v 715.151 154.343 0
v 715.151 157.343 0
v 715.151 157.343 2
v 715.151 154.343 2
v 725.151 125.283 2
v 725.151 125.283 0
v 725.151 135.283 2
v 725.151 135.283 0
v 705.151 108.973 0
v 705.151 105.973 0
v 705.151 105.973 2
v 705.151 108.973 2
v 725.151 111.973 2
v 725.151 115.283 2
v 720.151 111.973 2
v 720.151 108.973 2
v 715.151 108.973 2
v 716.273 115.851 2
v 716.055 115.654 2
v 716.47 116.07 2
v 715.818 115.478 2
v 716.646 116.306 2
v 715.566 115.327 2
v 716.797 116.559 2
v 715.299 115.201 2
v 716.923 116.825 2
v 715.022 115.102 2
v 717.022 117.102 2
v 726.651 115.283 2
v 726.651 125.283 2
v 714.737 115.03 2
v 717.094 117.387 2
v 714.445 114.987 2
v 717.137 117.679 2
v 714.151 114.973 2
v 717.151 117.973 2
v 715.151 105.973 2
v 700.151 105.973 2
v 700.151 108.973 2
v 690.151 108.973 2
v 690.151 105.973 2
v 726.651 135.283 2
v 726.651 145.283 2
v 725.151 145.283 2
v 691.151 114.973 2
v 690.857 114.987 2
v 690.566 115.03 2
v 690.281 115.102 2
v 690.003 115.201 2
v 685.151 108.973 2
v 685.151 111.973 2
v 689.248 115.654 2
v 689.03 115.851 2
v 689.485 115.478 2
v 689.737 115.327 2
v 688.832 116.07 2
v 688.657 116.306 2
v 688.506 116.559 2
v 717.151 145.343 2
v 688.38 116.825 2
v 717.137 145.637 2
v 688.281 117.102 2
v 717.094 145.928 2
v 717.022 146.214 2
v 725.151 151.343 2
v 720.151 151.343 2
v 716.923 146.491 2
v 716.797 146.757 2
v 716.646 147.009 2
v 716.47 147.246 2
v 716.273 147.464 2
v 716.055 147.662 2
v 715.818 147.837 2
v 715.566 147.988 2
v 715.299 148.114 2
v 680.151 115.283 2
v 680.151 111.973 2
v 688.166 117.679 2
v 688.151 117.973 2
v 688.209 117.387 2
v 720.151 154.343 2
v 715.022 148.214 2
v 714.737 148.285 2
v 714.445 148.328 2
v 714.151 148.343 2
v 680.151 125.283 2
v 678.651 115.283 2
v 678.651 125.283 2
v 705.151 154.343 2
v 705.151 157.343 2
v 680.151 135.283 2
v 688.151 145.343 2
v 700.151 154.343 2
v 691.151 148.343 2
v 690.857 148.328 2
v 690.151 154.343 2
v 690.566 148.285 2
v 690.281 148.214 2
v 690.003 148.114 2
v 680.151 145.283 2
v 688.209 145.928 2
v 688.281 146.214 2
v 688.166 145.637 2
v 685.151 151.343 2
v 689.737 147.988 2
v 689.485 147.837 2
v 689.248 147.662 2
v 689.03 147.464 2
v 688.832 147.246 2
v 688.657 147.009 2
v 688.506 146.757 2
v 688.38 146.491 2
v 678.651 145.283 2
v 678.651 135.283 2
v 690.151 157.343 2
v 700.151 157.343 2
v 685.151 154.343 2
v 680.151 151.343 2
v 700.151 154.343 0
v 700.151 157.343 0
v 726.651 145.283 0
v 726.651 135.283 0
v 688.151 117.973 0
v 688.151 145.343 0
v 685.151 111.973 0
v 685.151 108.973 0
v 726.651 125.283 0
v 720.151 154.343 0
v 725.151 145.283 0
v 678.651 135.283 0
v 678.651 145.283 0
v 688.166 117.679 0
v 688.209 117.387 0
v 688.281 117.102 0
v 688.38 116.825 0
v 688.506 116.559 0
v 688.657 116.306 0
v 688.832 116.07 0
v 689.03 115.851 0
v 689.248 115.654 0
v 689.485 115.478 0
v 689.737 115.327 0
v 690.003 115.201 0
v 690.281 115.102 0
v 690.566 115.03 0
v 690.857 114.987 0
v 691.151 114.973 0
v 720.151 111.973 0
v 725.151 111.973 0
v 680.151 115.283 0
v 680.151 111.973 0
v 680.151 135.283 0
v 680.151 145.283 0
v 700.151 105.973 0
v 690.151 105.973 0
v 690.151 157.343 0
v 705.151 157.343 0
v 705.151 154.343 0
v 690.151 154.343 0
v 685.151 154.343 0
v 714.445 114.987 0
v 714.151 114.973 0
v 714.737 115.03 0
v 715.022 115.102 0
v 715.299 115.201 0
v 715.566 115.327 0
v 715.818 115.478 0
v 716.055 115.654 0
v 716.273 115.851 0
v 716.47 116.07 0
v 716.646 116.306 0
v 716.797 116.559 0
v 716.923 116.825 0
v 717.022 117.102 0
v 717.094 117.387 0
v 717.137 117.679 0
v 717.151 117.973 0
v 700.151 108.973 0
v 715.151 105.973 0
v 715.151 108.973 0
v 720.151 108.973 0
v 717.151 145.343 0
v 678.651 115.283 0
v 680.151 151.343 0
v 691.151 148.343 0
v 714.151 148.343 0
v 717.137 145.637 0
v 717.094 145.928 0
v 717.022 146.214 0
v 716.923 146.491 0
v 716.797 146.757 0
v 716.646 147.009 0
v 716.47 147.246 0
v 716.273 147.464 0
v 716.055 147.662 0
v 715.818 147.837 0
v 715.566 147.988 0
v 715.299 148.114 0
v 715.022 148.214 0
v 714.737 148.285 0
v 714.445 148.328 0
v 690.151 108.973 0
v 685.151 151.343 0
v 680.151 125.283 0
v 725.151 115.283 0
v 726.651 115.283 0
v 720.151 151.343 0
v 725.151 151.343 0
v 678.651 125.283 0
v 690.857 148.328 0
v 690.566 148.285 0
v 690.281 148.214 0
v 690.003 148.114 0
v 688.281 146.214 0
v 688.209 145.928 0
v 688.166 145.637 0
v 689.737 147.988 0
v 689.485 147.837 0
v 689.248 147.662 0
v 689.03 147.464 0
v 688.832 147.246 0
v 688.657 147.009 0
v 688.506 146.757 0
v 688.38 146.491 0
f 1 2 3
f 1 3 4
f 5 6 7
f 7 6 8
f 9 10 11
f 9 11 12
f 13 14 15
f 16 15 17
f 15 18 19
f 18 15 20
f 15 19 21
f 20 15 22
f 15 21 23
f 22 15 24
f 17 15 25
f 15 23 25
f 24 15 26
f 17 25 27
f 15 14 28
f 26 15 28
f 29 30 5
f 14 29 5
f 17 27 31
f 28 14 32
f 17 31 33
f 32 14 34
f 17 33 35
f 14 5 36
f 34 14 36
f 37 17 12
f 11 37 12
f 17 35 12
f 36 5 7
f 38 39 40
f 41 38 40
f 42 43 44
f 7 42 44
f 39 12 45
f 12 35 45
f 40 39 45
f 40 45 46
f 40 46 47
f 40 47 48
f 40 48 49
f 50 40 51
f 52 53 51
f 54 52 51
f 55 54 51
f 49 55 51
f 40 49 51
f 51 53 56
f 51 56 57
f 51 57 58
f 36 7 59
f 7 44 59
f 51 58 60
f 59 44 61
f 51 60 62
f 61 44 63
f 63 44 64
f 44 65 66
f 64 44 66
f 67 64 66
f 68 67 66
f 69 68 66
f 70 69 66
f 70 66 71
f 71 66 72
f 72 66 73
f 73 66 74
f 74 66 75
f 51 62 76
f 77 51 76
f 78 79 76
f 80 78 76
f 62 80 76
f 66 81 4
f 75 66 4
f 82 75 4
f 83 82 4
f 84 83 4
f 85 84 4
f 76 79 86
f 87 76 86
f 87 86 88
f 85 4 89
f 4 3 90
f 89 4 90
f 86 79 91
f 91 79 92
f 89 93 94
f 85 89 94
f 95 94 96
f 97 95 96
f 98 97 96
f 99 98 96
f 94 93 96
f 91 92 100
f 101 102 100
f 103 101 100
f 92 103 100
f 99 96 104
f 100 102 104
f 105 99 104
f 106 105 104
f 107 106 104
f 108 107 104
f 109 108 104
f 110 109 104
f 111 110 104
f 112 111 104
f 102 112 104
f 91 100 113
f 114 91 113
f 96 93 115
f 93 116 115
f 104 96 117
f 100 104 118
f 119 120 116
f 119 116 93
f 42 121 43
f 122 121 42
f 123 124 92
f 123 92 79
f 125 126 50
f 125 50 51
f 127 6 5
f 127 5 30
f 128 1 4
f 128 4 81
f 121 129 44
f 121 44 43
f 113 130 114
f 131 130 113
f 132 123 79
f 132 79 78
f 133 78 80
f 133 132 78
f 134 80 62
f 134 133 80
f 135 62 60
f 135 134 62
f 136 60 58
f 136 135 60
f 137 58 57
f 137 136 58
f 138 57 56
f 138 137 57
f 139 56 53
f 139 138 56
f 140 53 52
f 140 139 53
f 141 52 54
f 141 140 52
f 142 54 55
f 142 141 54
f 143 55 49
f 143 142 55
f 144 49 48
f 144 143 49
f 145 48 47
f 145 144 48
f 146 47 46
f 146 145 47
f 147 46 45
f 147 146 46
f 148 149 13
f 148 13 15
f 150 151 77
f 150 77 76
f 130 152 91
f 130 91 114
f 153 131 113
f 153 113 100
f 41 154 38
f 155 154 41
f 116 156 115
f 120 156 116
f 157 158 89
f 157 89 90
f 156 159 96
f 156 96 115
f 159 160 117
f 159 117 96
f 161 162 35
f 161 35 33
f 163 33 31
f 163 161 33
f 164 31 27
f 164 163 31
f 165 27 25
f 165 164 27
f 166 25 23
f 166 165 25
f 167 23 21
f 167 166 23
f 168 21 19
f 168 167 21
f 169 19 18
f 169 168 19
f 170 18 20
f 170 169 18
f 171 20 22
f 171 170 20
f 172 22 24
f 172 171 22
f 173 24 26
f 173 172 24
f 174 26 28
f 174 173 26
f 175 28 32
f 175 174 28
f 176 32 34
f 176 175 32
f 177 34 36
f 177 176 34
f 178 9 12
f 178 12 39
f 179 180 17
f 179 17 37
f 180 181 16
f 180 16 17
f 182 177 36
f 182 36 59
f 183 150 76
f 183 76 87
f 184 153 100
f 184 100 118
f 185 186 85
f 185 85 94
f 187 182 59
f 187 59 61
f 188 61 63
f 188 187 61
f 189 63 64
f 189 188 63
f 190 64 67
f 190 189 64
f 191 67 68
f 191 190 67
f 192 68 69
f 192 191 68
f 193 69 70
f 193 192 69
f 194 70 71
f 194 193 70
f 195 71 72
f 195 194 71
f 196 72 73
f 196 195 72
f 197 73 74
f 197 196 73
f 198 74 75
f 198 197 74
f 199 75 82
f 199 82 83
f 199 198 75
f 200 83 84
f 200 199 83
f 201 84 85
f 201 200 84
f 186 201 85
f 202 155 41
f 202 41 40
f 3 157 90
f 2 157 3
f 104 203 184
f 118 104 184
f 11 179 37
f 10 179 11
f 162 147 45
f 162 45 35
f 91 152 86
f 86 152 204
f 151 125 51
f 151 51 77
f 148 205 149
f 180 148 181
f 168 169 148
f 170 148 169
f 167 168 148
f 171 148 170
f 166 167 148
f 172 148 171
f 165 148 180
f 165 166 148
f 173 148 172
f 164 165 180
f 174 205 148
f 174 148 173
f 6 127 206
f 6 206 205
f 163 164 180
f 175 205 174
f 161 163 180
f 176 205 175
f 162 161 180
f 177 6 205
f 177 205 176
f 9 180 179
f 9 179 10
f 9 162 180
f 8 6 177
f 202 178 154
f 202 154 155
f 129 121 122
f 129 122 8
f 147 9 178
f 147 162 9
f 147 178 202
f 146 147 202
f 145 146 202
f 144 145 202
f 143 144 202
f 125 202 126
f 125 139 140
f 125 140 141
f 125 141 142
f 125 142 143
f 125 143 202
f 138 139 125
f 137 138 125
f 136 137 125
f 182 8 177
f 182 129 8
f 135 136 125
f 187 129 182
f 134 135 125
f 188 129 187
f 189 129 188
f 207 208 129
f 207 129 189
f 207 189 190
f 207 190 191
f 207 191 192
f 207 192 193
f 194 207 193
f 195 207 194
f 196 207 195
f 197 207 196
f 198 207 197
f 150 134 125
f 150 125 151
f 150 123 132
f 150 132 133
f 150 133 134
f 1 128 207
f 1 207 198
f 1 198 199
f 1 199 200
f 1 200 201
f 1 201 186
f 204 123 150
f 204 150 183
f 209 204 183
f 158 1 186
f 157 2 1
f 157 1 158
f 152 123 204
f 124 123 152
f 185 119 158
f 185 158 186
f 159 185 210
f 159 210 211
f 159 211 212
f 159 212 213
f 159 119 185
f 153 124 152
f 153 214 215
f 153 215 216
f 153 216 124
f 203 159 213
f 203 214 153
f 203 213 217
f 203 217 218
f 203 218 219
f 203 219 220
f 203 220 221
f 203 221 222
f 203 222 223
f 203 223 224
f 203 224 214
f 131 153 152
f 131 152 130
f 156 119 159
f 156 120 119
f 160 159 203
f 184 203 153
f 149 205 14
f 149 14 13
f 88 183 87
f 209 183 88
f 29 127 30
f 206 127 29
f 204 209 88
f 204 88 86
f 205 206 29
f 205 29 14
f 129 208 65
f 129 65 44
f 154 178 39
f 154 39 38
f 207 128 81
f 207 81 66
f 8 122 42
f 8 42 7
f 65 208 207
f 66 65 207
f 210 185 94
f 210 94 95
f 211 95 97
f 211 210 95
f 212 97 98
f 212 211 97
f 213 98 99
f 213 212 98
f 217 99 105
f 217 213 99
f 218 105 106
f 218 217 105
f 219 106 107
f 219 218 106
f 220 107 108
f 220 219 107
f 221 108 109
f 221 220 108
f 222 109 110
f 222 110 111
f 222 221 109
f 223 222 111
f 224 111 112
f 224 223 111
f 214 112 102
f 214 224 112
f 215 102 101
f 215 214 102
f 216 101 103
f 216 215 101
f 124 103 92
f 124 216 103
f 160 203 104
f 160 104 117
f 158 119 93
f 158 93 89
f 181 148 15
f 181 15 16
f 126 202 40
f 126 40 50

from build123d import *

# Parameters (mm, degrees)
EXTRUDE_1_DEPTH = 2


with BuildPart() as part:
    # Model → 凸台-拉伸1 (new body)
    with BuildSketch(Plane.XY):
        Polygon((682.151439572, 151.342718787), (685.151439572, 151.342718787), (685.151439572, 154.342718787), (690.151439572, 154.342718787), (690.151439572, 157.342718787), (700.151439572, 157.342718787), (700.151439572, 154.342718787), (705.151439572, 154.342718787), (705.151439572, 157.342718787), (715.151439572, 157.342718787), (715.151439572, 154.342718787), (720.151439572, 154.342718787), (720.151439572, 151.342718787), (723.151439572, 151.342718787), (725.151439572, 151.342718787), (725.151439572, 145.282718787), (726.651439572, 145.282718787), (726.651439572, 135.282718787), (725.151439572, 135.282718787), (725.151439572, 130.072718787), (725.151439572, 125.282718787), (726.651439572, 125.282718787), (726.651439572, 115.282718787), (725.151439572, 115.282718787), (725.151439572, 111.972718787), (720.151439572, 111.972718787), (720.151439572, 108.972718787), (715.151439572, 108.972718787), (715.151439572, 105.972718787), (705.151439572, 105.972718787), (705.151439572, 108.972718787), (700.151439572, 108.972718787), (700.151439572, 105.972718787), (690.151439572, 105.972718787), (690.151439572, 108.972718787), (685.151439572, 108.972718787), (685.151439572, 111.972718787), (680.151439572, 111.972718787), (680.151439572, 115.282718787), (678.651439572, 115.282718787), (678.651439572, 125.282718787), (680.151439572, 125.282718787), (680.151439572, 130.072718787), (680.151439572, 135.282718787), (678.651439572, 135.282718787), (678.651439572, 145.282718787), (680.151439572, 145.282718787), (680.151439572, 151.342718787), align=None)
        with BuildLine():
            Line((714.151439572, 148.342718787), (691.151439572, 148.342718787))
            ThreePointArc((691.151439572, 148.342718787), (689.030119228, 147.46403913), (688.151439572, 145.342718787))
            Line((688.151439572, 145.342718787), (688.151439572, 117.972718787))
            ThreePointArc((688.151439572, 117.972718787), (689.030119228, 115.851398443), (691.151439572, 114.972718787))
            Line((691.151439572, 114.972718787), (714.151439572, 114.972718787))
            ThreePointArc((714.151439572, 114.972718787), (716.272759915, 115.851398443), (717.151439572, 117.972718787))
            Line((717.151439572, 117.972718787), (717.151439572, 145.342718787))
            ThreePointArc((717.151439572, 145.342718787), (716.272759915, 147.46403913), (714.151439572, 148.342718787))
        make_face(mode=Mode.SUBTRACT)
    extrude(amount=EXTRUDE_1_DEPTH)


solid = part.part
